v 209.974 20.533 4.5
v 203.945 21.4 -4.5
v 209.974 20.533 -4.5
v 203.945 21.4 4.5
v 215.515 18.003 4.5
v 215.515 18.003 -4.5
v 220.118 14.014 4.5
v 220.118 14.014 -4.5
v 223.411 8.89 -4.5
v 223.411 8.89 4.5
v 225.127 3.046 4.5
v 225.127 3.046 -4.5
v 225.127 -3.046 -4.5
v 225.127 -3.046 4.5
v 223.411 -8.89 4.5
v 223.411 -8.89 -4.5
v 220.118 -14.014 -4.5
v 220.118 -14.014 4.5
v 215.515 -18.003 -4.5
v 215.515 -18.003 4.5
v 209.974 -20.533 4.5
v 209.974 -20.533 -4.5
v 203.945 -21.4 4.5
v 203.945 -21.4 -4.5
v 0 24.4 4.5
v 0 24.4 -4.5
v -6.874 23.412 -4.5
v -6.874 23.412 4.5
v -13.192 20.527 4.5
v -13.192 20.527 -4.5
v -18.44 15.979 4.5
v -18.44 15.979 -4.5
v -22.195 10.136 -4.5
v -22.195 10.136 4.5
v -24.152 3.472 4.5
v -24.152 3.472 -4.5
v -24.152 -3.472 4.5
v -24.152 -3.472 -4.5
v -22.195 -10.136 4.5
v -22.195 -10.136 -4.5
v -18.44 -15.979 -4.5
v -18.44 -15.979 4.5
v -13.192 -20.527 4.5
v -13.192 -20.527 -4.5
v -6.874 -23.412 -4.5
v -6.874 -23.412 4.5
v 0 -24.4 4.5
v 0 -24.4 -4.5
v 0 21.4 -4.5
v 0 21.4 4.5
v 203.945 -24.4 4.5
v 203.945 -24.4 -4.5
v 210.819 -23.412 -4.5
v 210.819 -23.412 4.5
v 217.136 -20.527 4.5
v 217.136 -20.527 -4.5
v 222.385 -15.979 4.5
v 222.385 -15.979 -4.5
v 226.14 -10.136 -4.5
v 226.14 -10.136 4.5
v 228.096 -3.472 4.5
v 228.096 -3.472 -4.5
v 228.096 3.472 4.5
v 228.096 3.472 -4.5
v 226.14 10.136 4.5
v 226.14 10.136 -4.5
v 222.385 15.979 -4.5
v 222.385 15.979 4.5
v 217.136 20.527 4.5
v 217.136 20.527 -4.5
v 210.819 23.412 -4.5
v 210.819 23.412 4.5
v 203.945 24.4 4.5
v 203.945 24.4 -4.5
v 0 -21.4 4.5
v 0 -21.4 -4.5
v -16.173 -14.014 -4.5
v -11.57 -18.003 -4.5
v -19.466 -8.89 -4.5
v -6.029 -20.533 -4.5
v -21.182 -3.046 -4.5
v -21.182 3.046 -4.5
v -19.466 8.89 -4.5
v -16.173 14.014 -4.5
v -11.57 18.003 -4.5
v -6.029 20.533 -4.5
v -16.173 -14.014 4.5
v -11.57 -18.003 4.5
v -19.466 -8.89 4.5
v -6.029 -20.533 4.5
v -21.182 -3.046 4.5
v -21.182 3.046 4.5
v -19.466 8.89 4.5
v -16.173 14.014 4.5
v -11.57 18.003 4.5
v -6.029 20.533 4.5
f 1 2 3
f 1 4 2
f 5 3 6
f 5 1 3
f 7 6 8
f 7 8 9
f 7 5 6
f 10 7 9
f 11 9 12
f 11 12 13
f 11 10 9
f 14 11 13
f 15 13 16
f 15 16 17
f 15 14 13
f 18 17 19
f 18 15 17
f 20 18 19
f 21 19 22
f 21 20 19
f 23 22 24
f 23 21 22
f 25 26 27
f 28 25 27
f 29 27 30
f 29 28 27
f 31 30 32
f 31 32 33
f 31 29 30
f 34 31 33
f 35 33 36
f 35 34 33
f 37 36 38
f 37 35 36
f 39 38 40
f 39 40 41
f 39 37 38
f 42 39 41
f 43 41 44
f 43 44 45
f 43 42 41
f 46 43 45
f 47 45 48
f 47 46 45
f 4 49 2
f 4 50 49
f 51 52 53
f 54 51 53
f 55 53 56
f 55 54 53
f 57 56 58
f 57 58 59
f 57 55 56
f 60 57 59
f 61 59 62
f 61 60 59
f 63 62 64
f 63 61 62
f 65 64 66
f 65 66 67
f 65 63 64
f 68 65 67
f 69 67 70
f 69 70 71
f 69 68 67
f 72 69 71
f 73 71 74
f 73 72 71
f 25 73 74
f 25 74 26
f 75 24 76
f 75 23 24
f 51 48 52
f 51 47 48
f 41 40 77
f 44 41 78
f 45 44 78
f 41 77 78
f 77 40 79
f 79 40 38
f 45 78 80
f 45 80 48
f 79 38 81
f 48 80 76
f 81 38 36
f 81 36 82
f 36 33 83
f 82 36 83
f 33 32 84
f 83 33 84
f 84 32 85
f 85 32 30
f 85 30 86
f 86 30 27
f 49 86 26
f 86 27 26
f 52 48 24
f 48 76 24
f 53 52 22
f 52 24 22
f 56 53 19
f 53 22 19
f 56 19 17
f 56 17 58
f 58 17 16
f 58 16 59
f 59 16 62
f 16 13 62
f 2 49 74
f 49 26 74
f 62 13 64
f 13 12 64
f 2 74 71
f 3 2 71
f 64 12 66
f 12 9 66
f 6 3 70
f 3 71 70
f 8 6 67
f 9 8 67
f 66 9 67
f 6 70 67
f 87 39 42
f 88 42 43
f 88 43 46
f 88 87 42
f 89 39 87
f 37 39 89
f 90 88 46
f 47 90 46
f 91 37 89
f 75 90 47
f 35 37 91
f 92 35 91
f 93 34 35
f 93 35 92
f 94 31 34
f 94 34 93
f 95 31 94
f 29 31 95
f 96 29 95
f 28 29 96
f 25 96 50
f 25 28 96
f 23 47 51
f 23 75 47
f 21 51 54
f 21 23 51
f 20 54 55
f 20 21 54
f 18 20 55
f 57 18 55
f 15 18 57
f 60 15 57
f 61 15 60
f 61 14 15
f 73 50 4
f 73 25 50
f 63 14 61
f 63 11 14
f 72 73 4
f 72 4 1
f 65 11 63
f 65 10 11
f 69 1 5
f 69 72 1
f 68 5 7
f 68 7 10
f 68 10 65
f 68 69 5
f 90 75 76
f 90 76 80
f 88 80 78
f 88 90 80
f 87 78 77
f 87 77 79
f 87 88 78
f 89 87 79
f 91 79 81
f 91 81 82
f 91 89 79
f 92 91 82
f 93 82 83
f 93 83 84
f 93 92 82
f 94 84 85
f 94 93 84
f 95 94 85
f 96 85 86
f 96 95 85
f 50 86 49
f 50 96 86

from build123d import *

# Parameters (mm, degrees)
RESSALTO_EXTRUS_O1_DEPTH = 4.5


with BuildPart() as part:
    # Esboço1 → Ressalto-extrusão1 (new body, symmetric)
    with BuildSketch(Plane.XY):
        with BuildLine():
            ThreePointArc((203.94484, -24.4), (228.34484, 0), (203.94484, 24.4))
            Line((203.94484, 24.4), (0, 24.4))
            ThreePointArc((0, 24.4), (-24.4, 0), (0, -24.4))
            Line((0, -24.4), (203.94484, -24.4))
        make_face()
        with BuildLine():
            ThreePointArc((0, -21.4), (-21.4, 0), (0, 21.4))
            Line((0, 21.4), (203.94484, 21.4))
            ThreePointArc((203.94484, 21.4), (225.34484, 0), (203.94484, -21.4))
            Line((203.94484, -21.4), (0, -21.4))
        make_face(mode=Mode.SUBTRACT)
    extrude(amount=RESSALTO_EXTRUS_O1_DEPTH, both=True)


solid = part.part
